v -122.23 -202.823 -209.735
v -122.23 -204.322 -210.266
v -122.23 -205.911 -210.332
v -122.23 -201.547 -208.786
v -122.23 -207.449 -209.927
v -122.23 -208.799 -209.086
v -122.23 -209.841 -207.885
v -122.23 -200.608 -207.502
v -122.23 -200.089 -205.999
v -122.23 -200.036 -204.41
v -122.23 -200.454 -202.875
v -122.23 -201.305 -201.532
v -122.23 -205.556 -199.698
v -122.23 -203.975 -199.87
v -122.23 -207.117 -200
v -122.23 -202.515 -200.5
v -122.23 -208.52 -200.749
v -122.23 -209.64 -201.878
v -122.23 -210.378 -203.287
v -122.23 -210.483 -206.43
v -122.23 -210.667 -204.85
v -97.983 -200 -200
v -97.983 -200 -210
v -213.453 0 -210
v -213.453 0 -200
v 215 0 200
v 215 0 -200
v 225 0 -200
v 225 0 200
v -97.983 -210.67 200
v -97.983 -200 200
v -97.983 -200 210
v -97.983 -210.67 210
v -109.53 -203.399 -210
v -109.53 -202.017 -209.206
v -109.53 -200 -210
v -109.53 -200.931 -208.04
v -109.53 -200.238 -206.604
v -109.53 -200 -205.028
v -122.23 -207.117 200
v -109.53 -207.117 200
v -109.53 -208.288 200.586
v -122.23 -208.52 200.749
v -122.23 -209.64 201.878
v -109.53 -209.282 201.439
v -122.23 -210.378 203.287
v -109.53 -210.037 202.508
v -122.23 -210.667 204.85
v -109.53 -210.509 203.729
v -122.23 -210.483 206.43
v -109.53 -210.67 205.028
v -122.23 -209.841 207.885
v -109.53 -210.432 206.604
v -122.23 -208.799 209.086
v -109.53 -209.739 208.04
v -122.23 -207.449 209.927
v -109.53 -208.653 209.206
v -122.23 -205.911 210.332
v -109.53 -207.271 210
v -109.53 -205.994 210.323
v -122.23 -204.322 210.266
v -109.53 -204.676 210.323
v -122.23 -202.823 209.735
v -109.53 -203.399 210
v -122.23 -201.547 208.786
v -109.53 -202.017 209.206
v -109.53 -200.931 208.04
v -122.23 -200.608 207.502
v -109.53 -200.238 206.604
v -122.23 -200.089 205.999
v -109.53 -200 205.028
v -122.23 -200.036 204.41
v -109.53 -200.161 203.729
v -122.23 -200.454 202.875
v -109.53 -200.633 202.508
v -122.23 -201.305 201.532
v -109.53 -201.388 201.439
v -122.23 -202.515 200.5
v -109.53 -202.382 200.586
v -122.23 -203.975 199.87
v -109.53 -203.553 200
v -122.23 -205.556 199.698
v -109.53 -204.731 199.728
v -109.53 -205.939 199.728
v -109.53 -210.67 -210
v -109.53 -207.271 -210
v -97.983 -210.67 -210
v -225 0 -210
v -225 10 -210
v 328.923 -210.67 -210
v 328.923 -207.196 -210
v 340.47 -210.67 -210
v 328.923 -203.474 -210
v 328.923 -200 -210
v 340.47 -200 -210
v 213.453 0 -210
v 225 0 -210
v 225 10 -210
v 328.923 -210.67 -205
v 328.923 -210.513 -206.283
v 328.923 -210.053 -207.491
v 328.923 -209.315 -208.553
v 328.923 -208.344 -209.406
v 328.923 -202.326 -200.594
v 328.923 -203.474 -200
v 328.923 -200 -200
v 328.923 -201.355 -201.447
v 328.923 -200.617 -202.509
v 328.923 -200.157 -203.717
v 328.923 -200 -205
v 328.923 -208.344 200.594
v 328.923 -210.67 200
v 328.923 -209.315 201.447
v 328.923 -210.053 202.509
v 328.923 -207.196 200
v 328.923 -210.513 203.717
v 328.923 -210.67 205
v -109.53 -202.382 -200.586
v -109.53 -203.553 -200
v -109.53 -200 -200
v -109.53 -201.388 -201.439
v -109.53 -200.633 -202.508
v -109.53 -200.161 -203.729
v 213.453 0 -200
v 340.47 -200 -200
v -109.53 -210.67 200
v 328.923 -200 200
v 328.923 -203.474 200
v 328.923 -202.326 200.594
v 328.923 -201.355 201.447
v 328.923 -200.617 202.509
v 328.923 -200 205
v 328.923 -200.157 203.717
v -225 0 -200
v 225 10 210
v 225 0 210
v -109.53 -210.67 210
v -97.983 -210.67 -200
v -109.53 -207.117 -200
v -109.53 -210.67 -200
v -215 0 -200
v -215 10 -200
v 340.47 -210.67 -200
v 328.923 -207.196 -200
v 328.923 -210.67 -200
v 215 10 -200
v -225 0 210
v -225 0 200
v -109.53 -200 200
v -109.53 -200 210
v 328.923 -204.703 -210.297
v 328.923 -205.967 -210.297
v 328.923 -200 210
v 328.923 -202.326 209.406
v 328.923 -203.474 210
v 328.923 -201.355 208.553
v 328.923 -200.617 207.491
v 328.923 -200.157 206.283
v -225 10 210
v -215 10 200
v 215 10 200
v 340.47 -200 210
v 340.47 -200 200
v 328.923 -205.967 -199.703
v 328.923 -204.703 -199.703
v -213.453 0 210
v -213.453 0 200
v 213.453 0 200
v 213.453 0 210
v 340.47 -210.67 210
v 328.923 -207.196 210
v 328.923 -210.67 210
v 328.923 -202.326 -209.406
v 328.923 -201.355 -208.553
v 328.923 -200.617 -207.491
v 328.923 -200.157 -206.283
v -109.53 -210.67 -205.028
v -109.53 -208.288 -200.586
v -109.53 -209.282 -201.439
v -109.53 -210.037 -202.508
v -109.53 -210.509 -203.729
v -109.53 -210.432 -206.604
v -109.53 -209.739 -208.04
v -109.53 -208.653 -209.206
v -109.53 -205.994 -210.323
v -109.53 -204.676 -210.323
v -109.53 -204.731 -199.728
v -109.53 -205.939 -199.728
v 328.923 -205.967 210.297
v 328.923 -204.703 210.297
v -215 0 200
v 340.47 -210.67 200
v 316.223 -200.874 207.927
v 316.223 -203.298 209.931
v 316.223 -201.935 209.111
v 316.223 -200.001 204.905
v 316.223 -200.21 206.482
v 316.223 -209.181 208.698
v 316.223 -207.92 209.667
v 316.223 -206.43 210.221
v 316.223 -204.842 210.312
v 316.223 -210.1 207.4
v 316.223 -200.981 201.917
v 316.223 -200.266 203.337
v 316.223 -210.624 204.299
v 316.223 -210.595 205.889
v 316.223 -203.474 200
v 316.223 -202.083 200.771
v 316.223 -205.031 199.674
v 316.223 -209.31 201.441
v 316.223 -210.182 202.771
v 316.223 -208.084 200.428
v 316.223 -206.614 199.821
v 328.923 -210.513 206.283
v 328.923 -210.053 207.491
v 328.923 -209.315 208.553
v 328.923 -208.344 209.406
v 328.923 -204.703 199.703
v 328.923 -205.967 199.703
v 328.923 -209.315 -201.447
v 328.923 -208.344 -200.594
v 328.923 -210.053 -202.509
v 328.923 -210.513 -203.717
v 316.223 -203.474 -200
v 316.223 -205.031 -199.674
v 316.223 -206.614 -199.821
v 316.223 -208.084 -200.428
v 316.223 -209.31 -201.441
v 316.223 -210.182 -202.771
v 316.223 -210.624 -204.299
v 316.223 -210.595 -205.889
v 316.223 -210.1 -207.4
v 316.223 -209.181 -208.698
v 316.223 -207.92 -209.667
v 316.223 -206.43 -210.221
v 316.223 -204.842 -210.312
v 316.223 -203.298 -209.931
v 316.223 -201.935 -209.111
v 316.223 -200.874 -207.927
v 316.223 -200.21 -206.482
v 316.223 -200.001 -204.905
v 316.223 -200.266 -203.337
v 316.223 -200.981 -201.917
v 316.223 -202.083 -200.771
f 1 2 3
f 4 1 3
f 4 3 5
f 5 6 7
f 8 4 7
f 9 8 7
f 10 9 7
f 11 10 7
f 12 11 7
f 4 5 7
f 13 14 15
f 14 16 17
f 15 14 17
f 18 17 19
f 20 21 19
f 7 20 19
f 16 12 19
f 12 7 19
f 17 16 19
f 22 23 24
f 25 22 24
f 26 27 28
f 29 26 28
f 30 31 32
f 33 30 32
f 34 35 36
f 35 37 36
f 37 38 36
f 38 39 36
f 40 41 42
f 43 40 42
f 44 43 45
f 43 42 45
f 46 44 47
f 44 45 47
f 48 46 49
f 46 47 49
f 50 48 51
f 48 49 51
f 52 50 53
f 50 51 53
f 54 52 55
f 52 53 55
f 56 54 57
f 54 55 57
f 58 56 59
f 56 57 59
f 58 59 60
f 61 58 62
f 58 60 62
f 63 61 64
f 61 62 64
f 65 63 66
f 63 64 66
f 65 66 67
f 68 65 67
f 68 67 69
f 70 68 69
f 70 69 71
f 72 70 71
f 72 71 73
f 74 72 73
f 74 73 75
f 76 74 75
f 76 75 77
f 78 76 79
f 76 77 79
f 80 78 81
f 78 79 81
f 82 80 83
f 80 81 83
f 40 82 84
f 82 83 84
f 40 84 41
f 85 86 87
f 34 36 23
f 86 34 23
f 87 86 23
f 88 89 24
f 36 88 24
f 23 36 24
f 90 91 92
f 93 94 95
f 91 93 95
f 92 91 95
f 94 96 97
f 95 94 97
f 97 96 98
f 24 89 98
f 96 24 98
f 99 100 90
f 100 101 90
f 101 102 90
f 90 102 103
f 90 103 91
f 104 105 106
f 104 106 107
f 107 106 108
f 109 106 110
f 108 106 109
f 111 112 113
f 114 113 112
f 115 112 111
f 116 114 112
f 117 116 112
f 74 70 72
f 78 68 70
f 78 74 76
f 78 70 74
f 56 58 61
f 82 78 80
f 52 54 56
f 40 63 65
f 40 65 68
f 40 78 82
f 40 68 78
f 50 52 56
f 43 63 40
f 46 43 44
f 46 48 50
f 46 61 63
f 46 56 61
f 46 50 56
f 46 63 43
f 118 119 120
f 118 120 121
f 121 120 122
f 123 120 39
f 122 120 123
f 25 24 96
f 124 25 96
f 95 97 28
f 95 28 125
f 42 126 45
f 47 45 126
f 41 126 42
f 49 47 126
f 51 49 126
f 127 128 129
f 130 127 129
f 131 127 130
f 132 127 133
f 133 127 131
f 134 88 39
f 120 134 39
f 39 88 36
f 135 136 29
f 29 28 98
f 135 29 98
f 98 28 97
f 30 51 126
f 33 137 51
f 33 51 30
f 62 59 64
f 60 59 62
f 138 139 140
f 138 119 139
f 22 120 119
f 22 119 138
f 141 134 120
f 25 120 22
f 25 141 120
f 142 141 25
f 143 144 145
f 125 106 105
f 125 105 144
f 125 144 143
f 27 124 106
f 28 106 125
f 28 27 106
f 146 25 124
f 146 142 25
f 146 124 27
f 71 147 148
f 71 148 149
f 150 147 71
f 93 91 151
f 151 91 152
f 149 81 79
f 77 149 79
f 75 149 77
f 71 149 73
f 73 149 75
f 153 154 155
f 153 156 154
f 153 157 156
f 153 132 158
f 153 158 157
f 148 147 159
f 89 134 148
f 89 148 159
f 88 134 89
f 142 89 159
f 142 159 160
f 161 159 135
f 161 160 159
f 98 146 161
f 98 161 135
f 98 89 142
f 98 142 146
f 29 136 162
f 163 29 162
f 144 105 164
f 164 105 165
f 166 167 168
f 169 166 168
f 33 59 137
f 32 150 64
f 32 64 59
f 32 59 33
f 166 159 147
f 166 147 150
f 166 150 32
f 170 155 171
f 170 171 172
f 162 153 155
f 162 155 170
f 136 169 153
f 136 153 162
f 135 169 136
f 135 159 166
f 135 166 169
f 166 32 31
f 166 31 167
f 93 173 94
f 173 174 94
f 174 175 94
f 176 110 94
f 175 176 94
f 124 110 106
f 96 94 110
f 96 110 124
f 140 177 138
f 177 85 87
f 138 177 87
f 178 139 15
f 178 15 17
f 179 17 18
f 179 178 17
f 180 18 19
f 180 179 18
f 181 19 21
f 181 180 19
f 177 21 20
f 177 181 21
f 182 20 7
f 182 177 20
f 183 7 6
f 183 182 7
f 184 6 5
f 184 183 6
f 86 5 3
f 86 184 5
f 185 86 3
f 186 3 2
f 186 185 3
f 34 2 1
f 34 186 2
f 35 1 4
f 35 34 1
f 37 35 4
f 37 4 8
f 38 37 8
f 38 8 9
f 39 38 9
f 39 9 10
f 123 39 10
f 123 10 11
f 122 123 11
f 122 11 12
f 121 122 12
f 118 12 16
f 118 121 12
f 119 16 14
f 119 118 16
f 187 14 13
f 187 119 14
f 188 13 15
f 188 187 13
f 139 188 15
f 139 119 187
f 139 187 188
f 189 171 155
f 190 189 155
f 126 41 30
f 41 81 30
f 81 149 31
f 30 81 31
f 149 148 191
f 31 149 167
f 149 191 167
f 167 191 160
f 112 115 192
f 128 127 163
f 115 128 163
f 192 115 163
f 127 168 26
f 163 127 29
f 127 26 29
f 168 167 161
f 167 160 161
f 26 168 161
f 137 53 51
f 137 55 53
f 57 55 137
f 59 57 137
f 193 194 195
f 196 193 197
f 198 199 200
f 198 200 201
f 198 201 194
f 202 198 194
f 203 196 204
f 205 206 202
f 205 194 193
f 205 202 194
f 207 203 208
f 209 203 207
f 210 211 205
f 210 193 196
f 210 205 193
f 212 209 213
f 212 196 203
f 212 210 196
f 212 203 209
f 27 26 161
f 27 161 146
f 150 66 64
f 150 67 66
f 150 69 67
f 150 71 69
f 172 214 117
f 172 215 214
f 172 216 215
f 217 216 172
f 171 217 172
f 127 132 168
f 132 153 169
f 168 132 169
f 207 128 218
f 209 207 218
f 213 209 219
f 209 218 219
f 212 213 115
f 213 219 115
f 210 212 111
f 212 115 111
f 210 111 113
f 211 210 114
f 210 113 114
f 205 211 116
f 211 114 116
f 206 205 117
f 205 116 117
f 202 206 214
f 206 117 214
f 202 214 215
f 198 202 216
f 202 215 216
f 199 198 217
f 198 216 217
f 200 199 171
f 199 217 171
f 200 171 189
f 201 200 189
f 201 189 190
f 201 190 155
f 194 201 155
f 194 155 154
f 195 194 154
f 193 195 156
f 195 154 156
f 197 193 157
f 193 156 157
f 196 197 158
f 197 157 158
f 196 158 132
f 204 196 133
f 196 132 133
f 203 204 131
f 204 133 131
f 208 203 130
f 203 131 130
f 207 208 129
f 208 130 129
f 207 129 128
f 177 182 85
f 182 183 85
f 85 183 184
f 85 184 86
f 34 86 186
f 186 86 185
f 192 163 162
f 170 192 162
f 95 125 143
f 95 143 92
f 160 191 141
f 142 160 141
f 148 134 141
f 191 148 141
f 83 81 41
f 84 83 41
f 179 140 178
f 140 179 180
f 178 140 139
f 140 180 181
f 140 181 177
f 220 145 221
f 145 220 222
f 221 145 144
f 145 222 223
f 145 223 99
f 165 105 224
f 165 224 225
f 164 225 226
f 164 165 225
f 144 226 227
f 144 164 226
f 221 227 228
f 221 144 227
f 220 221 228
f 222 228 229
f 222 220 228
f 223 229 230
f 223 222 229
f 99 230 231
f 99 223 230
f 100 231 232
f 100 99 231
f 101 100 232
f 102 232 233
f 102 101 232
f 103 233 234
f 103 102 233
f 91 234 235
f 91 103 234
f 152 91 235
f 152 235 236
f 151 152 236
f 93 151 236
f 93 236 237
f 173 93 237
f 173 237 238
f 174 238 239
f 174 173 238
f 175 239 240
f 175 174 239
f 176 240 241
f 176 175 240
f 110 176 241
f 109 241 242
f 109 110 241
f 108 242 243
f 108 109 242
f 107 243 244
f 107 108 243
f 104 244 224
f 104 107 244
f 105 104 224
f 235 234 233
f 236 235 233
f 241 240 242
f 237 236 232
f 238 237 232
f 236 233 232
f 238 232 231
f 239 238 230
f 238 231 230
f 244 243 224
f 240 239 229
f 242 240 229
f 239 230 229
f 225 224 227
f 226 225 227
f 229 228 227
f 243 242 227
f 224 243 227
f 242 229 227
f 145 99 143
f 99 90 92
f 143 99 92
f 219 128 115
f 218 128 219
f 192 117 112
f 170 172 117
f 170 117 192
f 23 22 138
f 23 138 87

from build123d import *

# Parameters (mm, degrees)
SKETCH1_W           = 450
SKETCH1_H           = 420
SKETCH1_W_2         = 430
SKETCH1_H_2         = 400
BOSS_EXTRUDE1_DEPTH = 10
BOSS_EXTRUDE2_DEPTH = 10
SKETCH8_W           = 11.547005384
SKETCH8_H           = 10
BOSS_EXTRUDE3_DEPTH = 10.67
SKETCH9_R           = 5.335
BOSS_EXTRUDE4_DEPTH = 12.7
SKETCH10_R          = 5.335
BOSS_EXTRUDE5_DEPTH = 12.7


with BuildPart() as part:
    # Sketch1 → Boss-Extrude1 (new body)
    with BuildSketch(Plane(origin=(0, 0, 0), x_dir=(1, 0, 0), z_dir=(0, 1, 0))):
        Rectangle(SKETCH1_W, SKETCH1_H)
        Rectangle(SKETCH1_W_2, SKETCH1_H_2, mode=Mode.SUBTRACT)
    extrude(amount=BOSS_EXTRUDE1_DEPTH)

    # Sketch4 → Boss-Extrude2 (add)
    with BuildSketch(Plane.XY.offset(210)):
        Polygon((-225, 0), (-109.529946162, -200), (-97.982940778, -200), (-213.452994616, 0), align=None)
        Polygon((225, 0), (340.470053838, -200), (328.923048454, -200), (213.452994616, 0), align=None)
    boss_extrude2 = extrude(amount=-BOSS_EXTRUDE2_DEPTH)

    # Mirror1: Boss-Extrude2 across plane
    add(boss_extrude2.mirror(Plane.XY))

    # Sketch8 → Boss-Extrude3 (add)
    with BuildSketch(Plane.XZ.offset(200)):
        with Locations((-103.75644347, 205)):
            Rectangle(SKETCH8_W, SKETCH8_H)
        with Locations((334.696551146, 205)):
            Rectangle(SKETCH8_W, SKETCH8_H)
    boss_extrude3 = extrude(amount=BOSS_EXTRUDE3_DEPTH)

    # Mirror2: Boss-Extrude3 across plane
    add(boss_extrude3.mirror(Plane.XY))

    # Sketch9 → Boss-Extrude4 (add)
    with BuildSketch(Plane.ZY.offset(109.529946162)):
        with Locations(Location((205.028494261, -205.335, 0), (0, 0, 199.516018921))):
            Circle(SKETCH9_R)
    boss_extrude4 = extrude(amount=BOSS_EXTRUDE4_DEPTH)

    # Sketch10 → Boss-Extrude5 (add)
    with BuildSketch(Plane.ZY.offset(-328.923048454)):
        with Locations(Location((205, -205.335, 0), (0, 0, 159.587697496))):
            Circle(SKETCH10_R)
    boss_extrude5 = extrude(amount=BOSS_EXTRUDE5_DEPTH)

    # Mirror3: Boss-Extrude4, Boss-Extrude5 across plane
    add(boss_extrude4.mirror(Plane.XY))
    add(boss_extrude5.mirror(Plane.XY))


solid = part.part
